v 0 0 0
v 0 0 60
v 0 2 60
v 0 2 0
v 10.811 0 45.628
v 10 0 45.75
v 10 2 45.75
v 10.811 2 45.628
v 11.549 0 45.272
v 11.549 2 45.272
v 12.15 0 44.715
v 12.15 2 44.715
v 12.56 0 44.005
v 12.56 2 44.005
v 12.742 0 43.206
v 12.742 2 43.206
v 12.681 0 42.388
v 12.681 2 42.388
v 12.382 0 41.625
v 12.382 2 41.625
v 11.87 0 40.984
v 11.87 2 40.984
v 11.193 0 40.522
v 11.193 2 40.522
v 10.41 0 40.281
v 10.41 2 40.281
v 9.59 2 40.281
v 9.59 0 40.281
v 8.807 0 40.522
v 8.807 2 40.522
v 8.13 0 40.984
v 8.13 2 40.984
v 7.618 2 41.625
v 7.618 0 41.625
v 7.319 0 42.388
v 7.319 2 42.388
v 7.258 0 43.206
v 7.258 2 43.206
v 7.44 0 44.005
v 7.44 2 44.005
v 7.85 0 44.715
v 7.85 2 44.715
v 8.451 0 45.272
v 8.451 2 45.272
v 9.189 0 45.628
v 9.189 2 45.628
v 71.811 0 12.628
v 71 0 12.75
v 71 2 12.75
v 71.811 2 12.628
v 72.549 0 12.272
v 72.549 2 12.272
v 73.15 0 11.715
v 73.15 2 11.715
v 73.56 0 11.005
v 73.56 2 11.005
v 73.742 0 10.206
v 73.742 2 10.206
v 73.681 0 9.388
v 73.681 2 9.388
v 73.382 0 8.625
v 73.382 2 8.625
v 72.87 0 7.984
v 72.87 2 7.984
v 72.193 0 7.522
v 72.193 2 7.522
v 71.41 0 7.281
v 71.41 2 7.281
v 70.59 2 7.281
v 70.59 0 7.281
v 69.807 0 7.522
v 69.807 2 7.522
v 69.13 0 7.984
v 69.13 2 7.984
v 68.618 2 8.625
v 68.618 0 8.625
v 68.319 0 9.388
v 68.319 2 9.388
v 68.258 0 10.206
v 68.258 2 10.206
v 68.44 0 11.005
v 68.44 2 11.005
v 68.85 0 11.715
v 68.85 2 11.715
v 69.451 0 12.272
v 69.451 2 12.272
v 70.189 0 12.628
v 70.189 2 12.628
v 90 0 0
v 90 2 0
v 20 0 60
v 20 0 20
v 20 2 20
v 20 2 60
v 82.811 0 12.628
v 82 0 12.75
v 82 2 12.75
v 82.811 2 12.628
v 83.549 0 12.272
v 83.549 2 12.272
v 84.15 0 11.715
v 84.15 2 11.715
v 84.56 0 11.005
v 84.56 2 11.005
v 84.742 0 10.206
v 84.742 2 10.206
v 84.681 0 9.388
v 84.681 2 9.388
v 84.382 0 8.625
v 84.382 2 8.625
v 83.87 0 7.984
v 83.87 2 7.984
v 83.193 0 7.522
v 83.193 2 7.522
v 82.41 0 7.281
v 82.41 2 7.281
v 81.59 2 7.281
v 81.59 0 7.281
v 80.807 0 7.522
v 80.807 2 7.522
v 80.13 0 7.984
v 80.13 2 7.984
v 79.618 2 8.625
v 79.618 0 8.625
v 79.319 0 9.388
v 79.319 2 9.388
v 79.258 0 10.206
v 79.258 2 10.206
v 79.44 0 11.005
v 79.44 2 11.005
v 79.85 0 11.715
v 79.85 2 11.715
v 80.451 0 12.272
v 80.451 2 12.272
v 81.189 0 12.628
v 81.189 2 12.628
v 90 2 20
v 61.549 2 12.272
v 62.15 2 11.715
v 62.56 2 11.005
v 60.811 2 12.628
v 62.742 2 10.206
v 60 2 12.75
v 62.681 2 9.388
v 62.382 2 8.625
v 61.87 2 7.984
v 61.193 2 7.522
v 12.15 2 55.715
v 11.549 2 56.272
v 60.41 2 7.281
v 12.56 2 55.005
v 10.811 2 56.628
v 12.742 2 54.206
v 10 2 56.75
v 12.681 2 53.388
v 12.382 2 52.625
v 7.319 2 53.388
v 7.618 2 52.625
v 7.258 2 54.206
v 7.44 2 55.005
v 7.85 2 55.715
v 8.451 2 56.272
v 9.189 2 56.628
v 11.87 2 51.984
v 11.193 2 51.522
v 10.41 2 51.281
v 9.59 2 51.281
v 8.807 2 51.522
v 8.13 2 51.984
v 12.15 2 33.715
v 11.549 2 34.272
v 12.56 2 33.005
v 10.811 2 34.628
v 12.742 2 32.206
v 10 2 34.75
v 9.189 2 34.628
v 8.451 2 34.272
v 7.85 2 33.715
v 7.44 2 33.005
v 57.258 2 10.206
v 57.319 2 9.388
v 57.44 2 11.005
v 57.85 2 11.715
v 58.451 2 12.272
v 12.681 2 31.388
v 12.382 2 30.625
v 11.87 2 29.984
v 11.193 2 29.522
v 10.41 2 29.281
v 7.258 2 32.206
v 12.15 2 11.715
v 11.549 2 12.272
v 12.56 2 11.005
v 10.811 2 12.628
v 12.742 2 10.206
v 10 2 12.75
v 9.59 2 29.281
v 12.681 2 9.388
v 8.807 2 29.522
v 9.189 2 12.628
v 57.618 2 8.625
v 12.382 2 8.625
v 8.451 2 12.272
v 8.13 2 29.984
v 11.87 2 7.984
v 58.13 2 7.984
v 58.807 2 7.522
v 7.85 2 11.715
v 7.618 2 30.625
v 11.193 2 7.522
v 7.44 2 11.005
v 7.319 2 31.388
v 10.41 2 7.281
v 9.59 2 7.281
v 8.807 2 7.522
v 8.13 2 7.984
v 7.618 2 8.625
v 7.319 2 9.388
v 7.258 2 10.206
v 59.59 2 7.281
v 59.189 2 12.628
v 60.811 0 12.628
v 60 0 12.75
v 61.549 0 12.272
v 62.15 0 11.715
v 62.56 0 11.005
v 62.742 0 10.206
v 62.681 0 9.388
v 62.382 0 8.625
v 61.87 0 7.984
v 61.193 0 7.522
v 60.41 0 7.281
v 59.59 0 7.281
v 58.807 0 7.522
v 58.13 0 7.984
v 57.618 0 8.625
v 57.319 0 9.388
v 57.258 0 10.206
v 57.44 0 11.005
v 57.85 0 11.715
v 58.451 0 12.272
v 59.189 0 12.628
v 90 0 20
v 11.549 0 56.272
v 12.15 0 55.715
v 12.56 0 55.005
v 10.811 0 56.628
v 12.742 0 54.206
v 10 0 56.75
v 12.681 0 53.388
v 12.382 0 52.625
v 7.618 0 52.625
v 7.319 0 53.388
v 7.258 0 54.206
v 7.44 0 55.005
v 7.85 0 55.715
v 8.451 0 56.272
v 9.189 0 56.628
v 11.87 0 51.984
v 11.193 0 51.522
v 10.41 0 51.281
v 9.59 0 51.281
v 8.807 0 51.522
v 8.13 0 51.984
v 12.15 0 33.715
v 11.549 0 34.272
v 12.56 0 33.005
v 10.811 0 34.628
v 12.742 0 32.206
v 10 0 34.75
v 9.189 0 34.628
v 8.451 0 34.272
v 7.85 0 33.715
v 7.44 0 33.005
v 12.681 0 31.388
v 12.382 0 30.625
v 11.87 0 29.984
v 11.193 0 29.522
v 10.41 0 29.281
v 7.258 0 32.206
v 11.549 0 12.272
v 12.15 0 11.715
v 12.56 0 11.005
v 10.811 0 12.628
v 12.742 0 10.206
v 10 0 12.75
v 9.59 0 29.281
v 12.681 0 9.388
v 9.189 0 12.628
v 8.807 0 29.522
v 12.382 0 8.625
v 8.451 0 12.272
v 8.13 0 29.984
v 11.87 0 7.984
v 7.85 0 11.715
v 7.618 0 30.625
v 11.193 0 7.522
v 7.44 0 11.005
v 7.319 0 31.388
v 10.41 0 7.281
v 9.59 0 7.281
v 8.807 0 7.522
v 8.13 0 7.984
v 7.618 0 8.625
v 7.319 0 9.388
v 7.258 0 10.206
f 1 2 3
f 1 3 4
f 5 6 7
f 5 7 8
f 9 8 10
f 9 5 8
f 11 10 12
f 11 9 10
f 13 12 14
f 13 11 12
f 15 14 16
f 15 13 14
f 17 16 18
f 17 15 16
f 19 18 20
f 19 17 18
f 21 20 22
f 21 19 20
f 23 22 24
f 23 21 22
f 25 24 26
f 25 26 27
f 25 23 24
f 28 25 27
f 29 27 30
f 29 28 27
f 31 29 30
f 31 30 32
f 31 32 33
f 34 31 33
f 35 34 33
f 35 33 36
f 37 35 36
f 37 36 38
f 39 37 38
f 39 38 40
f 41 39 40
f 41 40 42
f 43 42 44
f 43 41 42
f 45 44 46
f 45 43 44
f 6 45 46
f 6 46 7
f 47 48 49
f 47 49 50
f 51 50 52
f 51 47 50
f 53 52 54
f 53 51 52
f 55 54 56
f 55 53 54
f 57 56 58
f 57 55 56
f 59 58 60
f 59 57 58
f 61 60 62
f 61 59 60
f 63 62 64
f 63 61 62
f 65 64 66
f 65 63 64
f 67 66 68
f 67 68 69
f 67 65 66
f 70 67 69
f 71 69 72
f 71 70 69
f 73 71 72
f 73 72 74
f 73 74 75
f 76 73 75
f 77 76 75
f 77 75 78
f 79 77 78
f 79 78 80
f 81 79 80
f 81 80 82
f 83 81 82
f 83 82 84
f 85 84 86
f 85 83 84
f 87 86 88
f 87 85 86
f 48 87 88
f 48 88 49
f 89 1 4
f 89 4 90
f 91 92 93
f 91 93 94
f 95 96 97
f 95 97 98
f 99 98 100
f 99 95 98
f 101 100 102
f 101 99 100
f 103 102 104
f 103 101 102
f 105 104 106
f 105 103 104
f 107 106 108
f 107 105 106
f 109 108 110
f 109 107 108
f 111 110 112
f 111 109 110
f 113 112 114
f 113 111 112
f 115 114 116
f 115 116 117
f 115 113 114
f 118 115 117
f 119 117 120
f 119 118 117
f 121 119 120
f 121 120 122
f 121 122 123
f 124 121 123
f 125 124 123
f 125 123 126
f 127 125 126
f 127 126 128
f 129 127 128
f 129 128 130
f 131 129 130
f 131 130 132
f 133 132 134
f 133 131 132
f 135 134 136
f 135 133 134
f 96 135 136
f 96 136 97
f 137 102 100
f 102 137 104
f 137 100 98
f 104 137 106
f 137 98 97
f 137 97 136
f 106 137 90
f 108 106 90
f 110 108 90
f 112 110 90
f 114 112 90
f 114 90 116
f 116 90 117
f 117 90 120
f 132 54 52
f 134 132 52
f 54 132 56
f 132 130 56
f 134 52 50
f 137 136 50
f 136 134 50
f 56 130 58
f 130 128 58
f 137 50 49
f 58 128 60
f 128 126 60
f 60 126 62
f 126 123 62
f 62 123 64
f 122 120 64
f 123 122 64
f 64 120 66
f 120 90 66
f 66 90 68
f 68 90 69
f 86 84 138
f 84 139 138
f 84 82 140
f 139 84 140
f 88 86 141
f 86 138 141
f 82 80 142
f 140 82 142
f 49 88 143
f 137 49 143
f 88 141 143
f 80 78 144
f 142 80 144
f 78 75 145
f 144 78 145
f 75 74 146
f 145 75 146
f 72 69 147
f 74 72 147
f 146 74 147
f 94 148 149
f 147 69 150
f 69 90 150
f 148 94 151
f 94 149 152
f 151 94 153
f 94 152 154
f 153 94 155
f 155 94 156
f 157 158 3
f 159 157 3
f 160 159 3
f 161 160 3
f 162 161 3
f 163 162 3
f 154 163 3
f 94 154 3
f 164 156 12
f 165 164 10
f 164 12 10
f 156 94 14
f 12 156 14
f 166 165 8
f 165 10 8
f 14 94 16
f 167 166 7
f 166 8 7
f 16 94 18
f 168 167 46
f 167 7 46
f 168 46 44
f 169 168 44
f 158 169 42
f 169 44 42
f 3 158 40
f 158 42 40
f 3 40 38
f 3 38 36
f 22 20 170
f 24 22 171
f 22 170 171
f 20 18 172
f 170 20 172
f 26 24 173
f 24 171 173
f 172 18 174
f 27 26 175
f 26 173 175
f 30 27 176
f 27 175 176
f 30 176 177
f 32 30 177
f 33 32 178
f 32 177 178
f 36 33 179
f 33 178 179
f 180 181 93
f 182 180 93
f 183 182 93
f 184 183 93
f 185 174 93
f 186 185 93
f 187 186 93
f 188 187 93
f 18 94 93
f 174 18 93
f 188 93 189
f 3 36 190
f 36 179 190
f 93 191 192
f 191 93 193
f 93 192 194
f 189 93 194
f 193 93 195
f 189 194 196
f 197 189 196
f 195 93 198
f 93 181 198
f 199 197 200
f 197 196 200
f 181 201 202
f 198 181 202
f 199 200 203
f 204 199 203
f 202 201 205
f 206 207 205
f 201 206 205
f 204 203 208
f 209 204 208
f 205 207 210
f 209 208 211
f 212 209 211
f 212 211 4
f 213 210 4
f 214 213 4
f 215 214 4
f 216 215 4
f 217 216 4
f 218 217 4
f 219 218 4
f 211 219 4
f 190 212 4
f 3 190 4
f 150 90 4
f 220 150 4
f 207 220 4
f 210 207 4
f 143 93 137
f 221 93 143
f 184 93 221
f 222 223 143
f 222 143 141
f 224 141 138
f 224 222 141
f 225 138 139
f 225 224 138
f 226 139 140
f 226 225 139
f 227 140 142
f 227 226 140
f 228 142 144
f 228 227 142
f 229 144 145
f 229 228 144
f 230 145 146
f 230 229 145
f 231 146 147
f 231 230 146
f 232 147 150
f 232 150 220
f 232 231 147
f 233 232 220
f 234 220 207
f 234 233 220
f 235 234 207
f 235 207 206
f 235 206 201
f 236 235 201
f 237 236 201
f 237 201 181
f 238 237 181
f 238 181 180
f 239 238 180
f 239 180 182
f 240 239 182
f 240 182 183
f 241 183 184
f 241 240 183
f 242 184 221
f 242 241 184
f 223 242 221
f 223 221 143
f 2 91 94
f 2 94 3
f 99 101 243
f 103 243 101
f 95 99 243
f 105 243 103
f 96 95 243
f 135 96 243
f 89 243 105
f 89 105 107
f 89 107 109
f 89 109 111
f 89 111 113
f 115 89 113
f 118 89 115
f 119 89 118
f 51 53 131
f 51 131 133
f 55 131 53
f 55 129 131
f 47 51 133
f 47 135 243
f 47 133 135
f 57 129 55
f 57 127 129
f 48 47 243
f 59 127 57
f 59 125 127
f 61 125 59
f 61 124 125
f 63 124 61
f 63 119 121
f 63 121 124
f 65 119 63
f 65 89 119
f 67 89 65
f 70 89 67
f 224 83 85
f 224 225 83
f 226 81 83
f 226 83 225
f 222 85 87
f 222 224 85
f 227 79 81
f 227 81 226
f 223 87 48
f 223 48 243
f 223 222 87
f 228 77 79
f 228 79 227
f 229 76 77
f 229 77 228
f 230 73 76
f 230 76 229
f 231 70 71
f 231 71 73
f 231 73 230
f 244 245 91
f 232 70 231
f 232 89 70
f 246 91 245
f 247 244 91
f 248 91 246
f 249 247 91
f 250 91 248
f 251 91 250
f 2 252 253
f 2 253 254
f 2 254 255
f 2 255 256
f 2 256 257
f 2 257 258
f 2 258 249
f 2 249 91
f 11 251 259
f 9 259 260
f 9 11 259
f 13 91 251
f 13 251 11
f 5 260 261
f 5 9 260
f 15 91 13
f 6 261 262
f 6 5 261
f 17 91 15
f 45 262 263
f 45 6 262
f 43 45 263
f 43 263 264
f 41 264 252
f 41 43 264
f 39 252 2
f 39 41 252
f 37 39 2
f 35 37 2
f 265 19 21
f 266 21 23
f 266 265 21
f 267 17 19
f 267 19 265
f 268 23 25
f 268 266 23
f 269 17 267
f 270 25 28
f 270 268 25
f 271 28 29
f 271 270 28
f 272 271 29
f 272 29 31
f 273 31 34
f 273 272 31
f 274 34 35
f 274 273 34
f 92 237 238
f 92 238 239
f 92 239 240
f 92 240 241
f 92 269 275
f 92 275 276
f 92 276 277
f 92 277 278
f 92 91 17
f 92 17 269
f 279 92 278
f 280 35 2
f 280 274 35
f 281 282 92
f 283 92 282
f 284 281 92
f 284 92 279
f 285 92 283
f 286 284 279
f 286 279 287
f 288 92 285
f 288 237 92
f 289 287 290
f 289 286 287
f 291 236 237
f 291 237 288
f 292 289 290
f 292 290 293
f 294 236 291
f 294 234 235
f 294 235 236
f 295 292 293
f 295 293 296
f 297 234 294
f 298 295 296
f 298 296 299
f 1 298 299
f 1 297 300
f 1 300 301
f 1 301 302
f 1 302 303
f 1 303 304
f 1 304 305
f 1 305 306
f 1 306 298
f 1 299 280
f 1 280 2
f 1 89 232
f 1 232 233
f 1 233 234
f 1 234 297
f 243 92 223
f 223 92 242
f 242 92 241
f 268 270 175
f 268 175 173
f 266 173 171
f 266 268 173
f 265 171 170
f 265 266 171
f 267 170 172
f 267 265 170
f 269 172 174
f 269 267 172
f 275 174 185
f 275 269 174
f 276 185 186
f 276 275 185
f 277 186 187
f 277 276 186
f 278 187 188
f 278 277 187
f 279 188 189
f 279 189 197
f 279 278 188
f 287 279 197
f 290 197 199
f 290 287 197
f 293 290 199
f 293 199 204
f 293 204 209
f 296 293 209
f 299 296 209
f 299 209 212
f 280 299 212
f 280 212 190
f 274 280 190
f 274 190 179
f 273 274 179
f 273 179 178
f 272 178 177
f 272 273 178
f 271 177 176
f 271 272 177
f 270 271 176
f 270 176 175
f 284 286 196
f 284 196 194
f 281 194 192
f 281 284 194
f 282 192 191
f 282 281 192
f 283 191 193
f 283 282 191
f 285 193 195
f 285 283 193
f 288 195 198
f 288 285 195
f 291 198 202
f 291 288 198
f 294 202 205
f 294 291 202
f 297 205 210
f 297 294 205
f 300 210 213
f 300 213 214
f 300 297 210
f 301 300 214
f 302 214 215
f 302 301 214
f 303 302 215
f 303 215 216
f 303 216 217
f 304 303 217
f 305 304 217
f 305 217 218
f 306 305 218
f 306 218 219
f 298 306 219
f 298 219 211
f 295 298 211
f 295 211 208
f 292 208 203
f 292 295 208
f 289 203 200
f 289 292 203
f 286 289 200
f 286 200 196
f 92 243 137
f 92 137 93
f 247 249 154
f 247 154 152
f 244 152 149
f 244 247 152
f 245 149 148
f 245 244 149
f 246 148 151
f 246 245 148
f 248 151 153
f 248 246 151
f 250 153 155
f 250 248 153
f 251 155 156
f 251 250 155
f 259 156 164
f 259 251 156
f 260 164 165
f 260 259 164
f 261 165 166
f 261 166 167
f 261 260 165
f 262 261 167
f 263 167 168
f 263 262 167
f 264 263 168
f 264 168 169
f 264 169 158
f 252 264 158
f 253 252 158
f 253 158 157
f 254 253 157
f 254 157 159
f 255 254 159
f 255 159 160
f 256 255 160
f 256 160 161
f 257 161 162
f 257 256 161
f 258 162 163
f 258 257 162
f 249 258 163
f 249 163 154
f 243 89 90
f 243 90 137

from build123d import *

# Parameters (mm, degrees)
SKETCH_1_R      = 2.75
EXTRUDE_1_DEPTH = 2


with BuildPart() as part:
    # 草图1 → 凸台-拉伸1 (new body)
    with BuildSketch(Plane(origin=(0, 0, 0), x_dir=(1, 0, 0), z_dir=(0, 1, 0))):
        Polygon((0, 0), (90, 0), (90, -20), (20, -20), (20, -60), (0, -60), align=None)
        with Locations(Location((10, -54, 0), (0, 0, 270))):
            Circle(SKETCH_1_R, mode=Mode.SUBTRACT)
        with Locations(Location((82, -10, 0), (0, 0, 270))):
            Circle(SKETCH_1_R, mode=Mode.SUBTRACT)
        with Locations(Location((10, -43, 0), (0, 0, 270))):
            Circle(SKETCH_1_R, mode=Mode.SUBTRACT)
        with Locations(Location((10, -32, 0), (0, 0, 270))):
            Circle(SKETCH_1_R, mode=Mode.SUBTRACT)
        with Locations(Location((71, -10, 0), (0, 0, 270))):
            Circle(SKETCH_1_R, mode=Mode.SUBTRACT)
        with Locations(Location((60, -10, 0), (0, 0, 270))):
            Circle(SKETCH_1_R, mode=Mode.SUBTRACT)
        with Locations(Location((10, -10, 0), (0, 0, 270))):
            Circle(SKETCH_1_R, mode=Mode.SUBTRACT)
    extrude(amount=EXTRUDE_1_DEPTH)


solid = part.part
